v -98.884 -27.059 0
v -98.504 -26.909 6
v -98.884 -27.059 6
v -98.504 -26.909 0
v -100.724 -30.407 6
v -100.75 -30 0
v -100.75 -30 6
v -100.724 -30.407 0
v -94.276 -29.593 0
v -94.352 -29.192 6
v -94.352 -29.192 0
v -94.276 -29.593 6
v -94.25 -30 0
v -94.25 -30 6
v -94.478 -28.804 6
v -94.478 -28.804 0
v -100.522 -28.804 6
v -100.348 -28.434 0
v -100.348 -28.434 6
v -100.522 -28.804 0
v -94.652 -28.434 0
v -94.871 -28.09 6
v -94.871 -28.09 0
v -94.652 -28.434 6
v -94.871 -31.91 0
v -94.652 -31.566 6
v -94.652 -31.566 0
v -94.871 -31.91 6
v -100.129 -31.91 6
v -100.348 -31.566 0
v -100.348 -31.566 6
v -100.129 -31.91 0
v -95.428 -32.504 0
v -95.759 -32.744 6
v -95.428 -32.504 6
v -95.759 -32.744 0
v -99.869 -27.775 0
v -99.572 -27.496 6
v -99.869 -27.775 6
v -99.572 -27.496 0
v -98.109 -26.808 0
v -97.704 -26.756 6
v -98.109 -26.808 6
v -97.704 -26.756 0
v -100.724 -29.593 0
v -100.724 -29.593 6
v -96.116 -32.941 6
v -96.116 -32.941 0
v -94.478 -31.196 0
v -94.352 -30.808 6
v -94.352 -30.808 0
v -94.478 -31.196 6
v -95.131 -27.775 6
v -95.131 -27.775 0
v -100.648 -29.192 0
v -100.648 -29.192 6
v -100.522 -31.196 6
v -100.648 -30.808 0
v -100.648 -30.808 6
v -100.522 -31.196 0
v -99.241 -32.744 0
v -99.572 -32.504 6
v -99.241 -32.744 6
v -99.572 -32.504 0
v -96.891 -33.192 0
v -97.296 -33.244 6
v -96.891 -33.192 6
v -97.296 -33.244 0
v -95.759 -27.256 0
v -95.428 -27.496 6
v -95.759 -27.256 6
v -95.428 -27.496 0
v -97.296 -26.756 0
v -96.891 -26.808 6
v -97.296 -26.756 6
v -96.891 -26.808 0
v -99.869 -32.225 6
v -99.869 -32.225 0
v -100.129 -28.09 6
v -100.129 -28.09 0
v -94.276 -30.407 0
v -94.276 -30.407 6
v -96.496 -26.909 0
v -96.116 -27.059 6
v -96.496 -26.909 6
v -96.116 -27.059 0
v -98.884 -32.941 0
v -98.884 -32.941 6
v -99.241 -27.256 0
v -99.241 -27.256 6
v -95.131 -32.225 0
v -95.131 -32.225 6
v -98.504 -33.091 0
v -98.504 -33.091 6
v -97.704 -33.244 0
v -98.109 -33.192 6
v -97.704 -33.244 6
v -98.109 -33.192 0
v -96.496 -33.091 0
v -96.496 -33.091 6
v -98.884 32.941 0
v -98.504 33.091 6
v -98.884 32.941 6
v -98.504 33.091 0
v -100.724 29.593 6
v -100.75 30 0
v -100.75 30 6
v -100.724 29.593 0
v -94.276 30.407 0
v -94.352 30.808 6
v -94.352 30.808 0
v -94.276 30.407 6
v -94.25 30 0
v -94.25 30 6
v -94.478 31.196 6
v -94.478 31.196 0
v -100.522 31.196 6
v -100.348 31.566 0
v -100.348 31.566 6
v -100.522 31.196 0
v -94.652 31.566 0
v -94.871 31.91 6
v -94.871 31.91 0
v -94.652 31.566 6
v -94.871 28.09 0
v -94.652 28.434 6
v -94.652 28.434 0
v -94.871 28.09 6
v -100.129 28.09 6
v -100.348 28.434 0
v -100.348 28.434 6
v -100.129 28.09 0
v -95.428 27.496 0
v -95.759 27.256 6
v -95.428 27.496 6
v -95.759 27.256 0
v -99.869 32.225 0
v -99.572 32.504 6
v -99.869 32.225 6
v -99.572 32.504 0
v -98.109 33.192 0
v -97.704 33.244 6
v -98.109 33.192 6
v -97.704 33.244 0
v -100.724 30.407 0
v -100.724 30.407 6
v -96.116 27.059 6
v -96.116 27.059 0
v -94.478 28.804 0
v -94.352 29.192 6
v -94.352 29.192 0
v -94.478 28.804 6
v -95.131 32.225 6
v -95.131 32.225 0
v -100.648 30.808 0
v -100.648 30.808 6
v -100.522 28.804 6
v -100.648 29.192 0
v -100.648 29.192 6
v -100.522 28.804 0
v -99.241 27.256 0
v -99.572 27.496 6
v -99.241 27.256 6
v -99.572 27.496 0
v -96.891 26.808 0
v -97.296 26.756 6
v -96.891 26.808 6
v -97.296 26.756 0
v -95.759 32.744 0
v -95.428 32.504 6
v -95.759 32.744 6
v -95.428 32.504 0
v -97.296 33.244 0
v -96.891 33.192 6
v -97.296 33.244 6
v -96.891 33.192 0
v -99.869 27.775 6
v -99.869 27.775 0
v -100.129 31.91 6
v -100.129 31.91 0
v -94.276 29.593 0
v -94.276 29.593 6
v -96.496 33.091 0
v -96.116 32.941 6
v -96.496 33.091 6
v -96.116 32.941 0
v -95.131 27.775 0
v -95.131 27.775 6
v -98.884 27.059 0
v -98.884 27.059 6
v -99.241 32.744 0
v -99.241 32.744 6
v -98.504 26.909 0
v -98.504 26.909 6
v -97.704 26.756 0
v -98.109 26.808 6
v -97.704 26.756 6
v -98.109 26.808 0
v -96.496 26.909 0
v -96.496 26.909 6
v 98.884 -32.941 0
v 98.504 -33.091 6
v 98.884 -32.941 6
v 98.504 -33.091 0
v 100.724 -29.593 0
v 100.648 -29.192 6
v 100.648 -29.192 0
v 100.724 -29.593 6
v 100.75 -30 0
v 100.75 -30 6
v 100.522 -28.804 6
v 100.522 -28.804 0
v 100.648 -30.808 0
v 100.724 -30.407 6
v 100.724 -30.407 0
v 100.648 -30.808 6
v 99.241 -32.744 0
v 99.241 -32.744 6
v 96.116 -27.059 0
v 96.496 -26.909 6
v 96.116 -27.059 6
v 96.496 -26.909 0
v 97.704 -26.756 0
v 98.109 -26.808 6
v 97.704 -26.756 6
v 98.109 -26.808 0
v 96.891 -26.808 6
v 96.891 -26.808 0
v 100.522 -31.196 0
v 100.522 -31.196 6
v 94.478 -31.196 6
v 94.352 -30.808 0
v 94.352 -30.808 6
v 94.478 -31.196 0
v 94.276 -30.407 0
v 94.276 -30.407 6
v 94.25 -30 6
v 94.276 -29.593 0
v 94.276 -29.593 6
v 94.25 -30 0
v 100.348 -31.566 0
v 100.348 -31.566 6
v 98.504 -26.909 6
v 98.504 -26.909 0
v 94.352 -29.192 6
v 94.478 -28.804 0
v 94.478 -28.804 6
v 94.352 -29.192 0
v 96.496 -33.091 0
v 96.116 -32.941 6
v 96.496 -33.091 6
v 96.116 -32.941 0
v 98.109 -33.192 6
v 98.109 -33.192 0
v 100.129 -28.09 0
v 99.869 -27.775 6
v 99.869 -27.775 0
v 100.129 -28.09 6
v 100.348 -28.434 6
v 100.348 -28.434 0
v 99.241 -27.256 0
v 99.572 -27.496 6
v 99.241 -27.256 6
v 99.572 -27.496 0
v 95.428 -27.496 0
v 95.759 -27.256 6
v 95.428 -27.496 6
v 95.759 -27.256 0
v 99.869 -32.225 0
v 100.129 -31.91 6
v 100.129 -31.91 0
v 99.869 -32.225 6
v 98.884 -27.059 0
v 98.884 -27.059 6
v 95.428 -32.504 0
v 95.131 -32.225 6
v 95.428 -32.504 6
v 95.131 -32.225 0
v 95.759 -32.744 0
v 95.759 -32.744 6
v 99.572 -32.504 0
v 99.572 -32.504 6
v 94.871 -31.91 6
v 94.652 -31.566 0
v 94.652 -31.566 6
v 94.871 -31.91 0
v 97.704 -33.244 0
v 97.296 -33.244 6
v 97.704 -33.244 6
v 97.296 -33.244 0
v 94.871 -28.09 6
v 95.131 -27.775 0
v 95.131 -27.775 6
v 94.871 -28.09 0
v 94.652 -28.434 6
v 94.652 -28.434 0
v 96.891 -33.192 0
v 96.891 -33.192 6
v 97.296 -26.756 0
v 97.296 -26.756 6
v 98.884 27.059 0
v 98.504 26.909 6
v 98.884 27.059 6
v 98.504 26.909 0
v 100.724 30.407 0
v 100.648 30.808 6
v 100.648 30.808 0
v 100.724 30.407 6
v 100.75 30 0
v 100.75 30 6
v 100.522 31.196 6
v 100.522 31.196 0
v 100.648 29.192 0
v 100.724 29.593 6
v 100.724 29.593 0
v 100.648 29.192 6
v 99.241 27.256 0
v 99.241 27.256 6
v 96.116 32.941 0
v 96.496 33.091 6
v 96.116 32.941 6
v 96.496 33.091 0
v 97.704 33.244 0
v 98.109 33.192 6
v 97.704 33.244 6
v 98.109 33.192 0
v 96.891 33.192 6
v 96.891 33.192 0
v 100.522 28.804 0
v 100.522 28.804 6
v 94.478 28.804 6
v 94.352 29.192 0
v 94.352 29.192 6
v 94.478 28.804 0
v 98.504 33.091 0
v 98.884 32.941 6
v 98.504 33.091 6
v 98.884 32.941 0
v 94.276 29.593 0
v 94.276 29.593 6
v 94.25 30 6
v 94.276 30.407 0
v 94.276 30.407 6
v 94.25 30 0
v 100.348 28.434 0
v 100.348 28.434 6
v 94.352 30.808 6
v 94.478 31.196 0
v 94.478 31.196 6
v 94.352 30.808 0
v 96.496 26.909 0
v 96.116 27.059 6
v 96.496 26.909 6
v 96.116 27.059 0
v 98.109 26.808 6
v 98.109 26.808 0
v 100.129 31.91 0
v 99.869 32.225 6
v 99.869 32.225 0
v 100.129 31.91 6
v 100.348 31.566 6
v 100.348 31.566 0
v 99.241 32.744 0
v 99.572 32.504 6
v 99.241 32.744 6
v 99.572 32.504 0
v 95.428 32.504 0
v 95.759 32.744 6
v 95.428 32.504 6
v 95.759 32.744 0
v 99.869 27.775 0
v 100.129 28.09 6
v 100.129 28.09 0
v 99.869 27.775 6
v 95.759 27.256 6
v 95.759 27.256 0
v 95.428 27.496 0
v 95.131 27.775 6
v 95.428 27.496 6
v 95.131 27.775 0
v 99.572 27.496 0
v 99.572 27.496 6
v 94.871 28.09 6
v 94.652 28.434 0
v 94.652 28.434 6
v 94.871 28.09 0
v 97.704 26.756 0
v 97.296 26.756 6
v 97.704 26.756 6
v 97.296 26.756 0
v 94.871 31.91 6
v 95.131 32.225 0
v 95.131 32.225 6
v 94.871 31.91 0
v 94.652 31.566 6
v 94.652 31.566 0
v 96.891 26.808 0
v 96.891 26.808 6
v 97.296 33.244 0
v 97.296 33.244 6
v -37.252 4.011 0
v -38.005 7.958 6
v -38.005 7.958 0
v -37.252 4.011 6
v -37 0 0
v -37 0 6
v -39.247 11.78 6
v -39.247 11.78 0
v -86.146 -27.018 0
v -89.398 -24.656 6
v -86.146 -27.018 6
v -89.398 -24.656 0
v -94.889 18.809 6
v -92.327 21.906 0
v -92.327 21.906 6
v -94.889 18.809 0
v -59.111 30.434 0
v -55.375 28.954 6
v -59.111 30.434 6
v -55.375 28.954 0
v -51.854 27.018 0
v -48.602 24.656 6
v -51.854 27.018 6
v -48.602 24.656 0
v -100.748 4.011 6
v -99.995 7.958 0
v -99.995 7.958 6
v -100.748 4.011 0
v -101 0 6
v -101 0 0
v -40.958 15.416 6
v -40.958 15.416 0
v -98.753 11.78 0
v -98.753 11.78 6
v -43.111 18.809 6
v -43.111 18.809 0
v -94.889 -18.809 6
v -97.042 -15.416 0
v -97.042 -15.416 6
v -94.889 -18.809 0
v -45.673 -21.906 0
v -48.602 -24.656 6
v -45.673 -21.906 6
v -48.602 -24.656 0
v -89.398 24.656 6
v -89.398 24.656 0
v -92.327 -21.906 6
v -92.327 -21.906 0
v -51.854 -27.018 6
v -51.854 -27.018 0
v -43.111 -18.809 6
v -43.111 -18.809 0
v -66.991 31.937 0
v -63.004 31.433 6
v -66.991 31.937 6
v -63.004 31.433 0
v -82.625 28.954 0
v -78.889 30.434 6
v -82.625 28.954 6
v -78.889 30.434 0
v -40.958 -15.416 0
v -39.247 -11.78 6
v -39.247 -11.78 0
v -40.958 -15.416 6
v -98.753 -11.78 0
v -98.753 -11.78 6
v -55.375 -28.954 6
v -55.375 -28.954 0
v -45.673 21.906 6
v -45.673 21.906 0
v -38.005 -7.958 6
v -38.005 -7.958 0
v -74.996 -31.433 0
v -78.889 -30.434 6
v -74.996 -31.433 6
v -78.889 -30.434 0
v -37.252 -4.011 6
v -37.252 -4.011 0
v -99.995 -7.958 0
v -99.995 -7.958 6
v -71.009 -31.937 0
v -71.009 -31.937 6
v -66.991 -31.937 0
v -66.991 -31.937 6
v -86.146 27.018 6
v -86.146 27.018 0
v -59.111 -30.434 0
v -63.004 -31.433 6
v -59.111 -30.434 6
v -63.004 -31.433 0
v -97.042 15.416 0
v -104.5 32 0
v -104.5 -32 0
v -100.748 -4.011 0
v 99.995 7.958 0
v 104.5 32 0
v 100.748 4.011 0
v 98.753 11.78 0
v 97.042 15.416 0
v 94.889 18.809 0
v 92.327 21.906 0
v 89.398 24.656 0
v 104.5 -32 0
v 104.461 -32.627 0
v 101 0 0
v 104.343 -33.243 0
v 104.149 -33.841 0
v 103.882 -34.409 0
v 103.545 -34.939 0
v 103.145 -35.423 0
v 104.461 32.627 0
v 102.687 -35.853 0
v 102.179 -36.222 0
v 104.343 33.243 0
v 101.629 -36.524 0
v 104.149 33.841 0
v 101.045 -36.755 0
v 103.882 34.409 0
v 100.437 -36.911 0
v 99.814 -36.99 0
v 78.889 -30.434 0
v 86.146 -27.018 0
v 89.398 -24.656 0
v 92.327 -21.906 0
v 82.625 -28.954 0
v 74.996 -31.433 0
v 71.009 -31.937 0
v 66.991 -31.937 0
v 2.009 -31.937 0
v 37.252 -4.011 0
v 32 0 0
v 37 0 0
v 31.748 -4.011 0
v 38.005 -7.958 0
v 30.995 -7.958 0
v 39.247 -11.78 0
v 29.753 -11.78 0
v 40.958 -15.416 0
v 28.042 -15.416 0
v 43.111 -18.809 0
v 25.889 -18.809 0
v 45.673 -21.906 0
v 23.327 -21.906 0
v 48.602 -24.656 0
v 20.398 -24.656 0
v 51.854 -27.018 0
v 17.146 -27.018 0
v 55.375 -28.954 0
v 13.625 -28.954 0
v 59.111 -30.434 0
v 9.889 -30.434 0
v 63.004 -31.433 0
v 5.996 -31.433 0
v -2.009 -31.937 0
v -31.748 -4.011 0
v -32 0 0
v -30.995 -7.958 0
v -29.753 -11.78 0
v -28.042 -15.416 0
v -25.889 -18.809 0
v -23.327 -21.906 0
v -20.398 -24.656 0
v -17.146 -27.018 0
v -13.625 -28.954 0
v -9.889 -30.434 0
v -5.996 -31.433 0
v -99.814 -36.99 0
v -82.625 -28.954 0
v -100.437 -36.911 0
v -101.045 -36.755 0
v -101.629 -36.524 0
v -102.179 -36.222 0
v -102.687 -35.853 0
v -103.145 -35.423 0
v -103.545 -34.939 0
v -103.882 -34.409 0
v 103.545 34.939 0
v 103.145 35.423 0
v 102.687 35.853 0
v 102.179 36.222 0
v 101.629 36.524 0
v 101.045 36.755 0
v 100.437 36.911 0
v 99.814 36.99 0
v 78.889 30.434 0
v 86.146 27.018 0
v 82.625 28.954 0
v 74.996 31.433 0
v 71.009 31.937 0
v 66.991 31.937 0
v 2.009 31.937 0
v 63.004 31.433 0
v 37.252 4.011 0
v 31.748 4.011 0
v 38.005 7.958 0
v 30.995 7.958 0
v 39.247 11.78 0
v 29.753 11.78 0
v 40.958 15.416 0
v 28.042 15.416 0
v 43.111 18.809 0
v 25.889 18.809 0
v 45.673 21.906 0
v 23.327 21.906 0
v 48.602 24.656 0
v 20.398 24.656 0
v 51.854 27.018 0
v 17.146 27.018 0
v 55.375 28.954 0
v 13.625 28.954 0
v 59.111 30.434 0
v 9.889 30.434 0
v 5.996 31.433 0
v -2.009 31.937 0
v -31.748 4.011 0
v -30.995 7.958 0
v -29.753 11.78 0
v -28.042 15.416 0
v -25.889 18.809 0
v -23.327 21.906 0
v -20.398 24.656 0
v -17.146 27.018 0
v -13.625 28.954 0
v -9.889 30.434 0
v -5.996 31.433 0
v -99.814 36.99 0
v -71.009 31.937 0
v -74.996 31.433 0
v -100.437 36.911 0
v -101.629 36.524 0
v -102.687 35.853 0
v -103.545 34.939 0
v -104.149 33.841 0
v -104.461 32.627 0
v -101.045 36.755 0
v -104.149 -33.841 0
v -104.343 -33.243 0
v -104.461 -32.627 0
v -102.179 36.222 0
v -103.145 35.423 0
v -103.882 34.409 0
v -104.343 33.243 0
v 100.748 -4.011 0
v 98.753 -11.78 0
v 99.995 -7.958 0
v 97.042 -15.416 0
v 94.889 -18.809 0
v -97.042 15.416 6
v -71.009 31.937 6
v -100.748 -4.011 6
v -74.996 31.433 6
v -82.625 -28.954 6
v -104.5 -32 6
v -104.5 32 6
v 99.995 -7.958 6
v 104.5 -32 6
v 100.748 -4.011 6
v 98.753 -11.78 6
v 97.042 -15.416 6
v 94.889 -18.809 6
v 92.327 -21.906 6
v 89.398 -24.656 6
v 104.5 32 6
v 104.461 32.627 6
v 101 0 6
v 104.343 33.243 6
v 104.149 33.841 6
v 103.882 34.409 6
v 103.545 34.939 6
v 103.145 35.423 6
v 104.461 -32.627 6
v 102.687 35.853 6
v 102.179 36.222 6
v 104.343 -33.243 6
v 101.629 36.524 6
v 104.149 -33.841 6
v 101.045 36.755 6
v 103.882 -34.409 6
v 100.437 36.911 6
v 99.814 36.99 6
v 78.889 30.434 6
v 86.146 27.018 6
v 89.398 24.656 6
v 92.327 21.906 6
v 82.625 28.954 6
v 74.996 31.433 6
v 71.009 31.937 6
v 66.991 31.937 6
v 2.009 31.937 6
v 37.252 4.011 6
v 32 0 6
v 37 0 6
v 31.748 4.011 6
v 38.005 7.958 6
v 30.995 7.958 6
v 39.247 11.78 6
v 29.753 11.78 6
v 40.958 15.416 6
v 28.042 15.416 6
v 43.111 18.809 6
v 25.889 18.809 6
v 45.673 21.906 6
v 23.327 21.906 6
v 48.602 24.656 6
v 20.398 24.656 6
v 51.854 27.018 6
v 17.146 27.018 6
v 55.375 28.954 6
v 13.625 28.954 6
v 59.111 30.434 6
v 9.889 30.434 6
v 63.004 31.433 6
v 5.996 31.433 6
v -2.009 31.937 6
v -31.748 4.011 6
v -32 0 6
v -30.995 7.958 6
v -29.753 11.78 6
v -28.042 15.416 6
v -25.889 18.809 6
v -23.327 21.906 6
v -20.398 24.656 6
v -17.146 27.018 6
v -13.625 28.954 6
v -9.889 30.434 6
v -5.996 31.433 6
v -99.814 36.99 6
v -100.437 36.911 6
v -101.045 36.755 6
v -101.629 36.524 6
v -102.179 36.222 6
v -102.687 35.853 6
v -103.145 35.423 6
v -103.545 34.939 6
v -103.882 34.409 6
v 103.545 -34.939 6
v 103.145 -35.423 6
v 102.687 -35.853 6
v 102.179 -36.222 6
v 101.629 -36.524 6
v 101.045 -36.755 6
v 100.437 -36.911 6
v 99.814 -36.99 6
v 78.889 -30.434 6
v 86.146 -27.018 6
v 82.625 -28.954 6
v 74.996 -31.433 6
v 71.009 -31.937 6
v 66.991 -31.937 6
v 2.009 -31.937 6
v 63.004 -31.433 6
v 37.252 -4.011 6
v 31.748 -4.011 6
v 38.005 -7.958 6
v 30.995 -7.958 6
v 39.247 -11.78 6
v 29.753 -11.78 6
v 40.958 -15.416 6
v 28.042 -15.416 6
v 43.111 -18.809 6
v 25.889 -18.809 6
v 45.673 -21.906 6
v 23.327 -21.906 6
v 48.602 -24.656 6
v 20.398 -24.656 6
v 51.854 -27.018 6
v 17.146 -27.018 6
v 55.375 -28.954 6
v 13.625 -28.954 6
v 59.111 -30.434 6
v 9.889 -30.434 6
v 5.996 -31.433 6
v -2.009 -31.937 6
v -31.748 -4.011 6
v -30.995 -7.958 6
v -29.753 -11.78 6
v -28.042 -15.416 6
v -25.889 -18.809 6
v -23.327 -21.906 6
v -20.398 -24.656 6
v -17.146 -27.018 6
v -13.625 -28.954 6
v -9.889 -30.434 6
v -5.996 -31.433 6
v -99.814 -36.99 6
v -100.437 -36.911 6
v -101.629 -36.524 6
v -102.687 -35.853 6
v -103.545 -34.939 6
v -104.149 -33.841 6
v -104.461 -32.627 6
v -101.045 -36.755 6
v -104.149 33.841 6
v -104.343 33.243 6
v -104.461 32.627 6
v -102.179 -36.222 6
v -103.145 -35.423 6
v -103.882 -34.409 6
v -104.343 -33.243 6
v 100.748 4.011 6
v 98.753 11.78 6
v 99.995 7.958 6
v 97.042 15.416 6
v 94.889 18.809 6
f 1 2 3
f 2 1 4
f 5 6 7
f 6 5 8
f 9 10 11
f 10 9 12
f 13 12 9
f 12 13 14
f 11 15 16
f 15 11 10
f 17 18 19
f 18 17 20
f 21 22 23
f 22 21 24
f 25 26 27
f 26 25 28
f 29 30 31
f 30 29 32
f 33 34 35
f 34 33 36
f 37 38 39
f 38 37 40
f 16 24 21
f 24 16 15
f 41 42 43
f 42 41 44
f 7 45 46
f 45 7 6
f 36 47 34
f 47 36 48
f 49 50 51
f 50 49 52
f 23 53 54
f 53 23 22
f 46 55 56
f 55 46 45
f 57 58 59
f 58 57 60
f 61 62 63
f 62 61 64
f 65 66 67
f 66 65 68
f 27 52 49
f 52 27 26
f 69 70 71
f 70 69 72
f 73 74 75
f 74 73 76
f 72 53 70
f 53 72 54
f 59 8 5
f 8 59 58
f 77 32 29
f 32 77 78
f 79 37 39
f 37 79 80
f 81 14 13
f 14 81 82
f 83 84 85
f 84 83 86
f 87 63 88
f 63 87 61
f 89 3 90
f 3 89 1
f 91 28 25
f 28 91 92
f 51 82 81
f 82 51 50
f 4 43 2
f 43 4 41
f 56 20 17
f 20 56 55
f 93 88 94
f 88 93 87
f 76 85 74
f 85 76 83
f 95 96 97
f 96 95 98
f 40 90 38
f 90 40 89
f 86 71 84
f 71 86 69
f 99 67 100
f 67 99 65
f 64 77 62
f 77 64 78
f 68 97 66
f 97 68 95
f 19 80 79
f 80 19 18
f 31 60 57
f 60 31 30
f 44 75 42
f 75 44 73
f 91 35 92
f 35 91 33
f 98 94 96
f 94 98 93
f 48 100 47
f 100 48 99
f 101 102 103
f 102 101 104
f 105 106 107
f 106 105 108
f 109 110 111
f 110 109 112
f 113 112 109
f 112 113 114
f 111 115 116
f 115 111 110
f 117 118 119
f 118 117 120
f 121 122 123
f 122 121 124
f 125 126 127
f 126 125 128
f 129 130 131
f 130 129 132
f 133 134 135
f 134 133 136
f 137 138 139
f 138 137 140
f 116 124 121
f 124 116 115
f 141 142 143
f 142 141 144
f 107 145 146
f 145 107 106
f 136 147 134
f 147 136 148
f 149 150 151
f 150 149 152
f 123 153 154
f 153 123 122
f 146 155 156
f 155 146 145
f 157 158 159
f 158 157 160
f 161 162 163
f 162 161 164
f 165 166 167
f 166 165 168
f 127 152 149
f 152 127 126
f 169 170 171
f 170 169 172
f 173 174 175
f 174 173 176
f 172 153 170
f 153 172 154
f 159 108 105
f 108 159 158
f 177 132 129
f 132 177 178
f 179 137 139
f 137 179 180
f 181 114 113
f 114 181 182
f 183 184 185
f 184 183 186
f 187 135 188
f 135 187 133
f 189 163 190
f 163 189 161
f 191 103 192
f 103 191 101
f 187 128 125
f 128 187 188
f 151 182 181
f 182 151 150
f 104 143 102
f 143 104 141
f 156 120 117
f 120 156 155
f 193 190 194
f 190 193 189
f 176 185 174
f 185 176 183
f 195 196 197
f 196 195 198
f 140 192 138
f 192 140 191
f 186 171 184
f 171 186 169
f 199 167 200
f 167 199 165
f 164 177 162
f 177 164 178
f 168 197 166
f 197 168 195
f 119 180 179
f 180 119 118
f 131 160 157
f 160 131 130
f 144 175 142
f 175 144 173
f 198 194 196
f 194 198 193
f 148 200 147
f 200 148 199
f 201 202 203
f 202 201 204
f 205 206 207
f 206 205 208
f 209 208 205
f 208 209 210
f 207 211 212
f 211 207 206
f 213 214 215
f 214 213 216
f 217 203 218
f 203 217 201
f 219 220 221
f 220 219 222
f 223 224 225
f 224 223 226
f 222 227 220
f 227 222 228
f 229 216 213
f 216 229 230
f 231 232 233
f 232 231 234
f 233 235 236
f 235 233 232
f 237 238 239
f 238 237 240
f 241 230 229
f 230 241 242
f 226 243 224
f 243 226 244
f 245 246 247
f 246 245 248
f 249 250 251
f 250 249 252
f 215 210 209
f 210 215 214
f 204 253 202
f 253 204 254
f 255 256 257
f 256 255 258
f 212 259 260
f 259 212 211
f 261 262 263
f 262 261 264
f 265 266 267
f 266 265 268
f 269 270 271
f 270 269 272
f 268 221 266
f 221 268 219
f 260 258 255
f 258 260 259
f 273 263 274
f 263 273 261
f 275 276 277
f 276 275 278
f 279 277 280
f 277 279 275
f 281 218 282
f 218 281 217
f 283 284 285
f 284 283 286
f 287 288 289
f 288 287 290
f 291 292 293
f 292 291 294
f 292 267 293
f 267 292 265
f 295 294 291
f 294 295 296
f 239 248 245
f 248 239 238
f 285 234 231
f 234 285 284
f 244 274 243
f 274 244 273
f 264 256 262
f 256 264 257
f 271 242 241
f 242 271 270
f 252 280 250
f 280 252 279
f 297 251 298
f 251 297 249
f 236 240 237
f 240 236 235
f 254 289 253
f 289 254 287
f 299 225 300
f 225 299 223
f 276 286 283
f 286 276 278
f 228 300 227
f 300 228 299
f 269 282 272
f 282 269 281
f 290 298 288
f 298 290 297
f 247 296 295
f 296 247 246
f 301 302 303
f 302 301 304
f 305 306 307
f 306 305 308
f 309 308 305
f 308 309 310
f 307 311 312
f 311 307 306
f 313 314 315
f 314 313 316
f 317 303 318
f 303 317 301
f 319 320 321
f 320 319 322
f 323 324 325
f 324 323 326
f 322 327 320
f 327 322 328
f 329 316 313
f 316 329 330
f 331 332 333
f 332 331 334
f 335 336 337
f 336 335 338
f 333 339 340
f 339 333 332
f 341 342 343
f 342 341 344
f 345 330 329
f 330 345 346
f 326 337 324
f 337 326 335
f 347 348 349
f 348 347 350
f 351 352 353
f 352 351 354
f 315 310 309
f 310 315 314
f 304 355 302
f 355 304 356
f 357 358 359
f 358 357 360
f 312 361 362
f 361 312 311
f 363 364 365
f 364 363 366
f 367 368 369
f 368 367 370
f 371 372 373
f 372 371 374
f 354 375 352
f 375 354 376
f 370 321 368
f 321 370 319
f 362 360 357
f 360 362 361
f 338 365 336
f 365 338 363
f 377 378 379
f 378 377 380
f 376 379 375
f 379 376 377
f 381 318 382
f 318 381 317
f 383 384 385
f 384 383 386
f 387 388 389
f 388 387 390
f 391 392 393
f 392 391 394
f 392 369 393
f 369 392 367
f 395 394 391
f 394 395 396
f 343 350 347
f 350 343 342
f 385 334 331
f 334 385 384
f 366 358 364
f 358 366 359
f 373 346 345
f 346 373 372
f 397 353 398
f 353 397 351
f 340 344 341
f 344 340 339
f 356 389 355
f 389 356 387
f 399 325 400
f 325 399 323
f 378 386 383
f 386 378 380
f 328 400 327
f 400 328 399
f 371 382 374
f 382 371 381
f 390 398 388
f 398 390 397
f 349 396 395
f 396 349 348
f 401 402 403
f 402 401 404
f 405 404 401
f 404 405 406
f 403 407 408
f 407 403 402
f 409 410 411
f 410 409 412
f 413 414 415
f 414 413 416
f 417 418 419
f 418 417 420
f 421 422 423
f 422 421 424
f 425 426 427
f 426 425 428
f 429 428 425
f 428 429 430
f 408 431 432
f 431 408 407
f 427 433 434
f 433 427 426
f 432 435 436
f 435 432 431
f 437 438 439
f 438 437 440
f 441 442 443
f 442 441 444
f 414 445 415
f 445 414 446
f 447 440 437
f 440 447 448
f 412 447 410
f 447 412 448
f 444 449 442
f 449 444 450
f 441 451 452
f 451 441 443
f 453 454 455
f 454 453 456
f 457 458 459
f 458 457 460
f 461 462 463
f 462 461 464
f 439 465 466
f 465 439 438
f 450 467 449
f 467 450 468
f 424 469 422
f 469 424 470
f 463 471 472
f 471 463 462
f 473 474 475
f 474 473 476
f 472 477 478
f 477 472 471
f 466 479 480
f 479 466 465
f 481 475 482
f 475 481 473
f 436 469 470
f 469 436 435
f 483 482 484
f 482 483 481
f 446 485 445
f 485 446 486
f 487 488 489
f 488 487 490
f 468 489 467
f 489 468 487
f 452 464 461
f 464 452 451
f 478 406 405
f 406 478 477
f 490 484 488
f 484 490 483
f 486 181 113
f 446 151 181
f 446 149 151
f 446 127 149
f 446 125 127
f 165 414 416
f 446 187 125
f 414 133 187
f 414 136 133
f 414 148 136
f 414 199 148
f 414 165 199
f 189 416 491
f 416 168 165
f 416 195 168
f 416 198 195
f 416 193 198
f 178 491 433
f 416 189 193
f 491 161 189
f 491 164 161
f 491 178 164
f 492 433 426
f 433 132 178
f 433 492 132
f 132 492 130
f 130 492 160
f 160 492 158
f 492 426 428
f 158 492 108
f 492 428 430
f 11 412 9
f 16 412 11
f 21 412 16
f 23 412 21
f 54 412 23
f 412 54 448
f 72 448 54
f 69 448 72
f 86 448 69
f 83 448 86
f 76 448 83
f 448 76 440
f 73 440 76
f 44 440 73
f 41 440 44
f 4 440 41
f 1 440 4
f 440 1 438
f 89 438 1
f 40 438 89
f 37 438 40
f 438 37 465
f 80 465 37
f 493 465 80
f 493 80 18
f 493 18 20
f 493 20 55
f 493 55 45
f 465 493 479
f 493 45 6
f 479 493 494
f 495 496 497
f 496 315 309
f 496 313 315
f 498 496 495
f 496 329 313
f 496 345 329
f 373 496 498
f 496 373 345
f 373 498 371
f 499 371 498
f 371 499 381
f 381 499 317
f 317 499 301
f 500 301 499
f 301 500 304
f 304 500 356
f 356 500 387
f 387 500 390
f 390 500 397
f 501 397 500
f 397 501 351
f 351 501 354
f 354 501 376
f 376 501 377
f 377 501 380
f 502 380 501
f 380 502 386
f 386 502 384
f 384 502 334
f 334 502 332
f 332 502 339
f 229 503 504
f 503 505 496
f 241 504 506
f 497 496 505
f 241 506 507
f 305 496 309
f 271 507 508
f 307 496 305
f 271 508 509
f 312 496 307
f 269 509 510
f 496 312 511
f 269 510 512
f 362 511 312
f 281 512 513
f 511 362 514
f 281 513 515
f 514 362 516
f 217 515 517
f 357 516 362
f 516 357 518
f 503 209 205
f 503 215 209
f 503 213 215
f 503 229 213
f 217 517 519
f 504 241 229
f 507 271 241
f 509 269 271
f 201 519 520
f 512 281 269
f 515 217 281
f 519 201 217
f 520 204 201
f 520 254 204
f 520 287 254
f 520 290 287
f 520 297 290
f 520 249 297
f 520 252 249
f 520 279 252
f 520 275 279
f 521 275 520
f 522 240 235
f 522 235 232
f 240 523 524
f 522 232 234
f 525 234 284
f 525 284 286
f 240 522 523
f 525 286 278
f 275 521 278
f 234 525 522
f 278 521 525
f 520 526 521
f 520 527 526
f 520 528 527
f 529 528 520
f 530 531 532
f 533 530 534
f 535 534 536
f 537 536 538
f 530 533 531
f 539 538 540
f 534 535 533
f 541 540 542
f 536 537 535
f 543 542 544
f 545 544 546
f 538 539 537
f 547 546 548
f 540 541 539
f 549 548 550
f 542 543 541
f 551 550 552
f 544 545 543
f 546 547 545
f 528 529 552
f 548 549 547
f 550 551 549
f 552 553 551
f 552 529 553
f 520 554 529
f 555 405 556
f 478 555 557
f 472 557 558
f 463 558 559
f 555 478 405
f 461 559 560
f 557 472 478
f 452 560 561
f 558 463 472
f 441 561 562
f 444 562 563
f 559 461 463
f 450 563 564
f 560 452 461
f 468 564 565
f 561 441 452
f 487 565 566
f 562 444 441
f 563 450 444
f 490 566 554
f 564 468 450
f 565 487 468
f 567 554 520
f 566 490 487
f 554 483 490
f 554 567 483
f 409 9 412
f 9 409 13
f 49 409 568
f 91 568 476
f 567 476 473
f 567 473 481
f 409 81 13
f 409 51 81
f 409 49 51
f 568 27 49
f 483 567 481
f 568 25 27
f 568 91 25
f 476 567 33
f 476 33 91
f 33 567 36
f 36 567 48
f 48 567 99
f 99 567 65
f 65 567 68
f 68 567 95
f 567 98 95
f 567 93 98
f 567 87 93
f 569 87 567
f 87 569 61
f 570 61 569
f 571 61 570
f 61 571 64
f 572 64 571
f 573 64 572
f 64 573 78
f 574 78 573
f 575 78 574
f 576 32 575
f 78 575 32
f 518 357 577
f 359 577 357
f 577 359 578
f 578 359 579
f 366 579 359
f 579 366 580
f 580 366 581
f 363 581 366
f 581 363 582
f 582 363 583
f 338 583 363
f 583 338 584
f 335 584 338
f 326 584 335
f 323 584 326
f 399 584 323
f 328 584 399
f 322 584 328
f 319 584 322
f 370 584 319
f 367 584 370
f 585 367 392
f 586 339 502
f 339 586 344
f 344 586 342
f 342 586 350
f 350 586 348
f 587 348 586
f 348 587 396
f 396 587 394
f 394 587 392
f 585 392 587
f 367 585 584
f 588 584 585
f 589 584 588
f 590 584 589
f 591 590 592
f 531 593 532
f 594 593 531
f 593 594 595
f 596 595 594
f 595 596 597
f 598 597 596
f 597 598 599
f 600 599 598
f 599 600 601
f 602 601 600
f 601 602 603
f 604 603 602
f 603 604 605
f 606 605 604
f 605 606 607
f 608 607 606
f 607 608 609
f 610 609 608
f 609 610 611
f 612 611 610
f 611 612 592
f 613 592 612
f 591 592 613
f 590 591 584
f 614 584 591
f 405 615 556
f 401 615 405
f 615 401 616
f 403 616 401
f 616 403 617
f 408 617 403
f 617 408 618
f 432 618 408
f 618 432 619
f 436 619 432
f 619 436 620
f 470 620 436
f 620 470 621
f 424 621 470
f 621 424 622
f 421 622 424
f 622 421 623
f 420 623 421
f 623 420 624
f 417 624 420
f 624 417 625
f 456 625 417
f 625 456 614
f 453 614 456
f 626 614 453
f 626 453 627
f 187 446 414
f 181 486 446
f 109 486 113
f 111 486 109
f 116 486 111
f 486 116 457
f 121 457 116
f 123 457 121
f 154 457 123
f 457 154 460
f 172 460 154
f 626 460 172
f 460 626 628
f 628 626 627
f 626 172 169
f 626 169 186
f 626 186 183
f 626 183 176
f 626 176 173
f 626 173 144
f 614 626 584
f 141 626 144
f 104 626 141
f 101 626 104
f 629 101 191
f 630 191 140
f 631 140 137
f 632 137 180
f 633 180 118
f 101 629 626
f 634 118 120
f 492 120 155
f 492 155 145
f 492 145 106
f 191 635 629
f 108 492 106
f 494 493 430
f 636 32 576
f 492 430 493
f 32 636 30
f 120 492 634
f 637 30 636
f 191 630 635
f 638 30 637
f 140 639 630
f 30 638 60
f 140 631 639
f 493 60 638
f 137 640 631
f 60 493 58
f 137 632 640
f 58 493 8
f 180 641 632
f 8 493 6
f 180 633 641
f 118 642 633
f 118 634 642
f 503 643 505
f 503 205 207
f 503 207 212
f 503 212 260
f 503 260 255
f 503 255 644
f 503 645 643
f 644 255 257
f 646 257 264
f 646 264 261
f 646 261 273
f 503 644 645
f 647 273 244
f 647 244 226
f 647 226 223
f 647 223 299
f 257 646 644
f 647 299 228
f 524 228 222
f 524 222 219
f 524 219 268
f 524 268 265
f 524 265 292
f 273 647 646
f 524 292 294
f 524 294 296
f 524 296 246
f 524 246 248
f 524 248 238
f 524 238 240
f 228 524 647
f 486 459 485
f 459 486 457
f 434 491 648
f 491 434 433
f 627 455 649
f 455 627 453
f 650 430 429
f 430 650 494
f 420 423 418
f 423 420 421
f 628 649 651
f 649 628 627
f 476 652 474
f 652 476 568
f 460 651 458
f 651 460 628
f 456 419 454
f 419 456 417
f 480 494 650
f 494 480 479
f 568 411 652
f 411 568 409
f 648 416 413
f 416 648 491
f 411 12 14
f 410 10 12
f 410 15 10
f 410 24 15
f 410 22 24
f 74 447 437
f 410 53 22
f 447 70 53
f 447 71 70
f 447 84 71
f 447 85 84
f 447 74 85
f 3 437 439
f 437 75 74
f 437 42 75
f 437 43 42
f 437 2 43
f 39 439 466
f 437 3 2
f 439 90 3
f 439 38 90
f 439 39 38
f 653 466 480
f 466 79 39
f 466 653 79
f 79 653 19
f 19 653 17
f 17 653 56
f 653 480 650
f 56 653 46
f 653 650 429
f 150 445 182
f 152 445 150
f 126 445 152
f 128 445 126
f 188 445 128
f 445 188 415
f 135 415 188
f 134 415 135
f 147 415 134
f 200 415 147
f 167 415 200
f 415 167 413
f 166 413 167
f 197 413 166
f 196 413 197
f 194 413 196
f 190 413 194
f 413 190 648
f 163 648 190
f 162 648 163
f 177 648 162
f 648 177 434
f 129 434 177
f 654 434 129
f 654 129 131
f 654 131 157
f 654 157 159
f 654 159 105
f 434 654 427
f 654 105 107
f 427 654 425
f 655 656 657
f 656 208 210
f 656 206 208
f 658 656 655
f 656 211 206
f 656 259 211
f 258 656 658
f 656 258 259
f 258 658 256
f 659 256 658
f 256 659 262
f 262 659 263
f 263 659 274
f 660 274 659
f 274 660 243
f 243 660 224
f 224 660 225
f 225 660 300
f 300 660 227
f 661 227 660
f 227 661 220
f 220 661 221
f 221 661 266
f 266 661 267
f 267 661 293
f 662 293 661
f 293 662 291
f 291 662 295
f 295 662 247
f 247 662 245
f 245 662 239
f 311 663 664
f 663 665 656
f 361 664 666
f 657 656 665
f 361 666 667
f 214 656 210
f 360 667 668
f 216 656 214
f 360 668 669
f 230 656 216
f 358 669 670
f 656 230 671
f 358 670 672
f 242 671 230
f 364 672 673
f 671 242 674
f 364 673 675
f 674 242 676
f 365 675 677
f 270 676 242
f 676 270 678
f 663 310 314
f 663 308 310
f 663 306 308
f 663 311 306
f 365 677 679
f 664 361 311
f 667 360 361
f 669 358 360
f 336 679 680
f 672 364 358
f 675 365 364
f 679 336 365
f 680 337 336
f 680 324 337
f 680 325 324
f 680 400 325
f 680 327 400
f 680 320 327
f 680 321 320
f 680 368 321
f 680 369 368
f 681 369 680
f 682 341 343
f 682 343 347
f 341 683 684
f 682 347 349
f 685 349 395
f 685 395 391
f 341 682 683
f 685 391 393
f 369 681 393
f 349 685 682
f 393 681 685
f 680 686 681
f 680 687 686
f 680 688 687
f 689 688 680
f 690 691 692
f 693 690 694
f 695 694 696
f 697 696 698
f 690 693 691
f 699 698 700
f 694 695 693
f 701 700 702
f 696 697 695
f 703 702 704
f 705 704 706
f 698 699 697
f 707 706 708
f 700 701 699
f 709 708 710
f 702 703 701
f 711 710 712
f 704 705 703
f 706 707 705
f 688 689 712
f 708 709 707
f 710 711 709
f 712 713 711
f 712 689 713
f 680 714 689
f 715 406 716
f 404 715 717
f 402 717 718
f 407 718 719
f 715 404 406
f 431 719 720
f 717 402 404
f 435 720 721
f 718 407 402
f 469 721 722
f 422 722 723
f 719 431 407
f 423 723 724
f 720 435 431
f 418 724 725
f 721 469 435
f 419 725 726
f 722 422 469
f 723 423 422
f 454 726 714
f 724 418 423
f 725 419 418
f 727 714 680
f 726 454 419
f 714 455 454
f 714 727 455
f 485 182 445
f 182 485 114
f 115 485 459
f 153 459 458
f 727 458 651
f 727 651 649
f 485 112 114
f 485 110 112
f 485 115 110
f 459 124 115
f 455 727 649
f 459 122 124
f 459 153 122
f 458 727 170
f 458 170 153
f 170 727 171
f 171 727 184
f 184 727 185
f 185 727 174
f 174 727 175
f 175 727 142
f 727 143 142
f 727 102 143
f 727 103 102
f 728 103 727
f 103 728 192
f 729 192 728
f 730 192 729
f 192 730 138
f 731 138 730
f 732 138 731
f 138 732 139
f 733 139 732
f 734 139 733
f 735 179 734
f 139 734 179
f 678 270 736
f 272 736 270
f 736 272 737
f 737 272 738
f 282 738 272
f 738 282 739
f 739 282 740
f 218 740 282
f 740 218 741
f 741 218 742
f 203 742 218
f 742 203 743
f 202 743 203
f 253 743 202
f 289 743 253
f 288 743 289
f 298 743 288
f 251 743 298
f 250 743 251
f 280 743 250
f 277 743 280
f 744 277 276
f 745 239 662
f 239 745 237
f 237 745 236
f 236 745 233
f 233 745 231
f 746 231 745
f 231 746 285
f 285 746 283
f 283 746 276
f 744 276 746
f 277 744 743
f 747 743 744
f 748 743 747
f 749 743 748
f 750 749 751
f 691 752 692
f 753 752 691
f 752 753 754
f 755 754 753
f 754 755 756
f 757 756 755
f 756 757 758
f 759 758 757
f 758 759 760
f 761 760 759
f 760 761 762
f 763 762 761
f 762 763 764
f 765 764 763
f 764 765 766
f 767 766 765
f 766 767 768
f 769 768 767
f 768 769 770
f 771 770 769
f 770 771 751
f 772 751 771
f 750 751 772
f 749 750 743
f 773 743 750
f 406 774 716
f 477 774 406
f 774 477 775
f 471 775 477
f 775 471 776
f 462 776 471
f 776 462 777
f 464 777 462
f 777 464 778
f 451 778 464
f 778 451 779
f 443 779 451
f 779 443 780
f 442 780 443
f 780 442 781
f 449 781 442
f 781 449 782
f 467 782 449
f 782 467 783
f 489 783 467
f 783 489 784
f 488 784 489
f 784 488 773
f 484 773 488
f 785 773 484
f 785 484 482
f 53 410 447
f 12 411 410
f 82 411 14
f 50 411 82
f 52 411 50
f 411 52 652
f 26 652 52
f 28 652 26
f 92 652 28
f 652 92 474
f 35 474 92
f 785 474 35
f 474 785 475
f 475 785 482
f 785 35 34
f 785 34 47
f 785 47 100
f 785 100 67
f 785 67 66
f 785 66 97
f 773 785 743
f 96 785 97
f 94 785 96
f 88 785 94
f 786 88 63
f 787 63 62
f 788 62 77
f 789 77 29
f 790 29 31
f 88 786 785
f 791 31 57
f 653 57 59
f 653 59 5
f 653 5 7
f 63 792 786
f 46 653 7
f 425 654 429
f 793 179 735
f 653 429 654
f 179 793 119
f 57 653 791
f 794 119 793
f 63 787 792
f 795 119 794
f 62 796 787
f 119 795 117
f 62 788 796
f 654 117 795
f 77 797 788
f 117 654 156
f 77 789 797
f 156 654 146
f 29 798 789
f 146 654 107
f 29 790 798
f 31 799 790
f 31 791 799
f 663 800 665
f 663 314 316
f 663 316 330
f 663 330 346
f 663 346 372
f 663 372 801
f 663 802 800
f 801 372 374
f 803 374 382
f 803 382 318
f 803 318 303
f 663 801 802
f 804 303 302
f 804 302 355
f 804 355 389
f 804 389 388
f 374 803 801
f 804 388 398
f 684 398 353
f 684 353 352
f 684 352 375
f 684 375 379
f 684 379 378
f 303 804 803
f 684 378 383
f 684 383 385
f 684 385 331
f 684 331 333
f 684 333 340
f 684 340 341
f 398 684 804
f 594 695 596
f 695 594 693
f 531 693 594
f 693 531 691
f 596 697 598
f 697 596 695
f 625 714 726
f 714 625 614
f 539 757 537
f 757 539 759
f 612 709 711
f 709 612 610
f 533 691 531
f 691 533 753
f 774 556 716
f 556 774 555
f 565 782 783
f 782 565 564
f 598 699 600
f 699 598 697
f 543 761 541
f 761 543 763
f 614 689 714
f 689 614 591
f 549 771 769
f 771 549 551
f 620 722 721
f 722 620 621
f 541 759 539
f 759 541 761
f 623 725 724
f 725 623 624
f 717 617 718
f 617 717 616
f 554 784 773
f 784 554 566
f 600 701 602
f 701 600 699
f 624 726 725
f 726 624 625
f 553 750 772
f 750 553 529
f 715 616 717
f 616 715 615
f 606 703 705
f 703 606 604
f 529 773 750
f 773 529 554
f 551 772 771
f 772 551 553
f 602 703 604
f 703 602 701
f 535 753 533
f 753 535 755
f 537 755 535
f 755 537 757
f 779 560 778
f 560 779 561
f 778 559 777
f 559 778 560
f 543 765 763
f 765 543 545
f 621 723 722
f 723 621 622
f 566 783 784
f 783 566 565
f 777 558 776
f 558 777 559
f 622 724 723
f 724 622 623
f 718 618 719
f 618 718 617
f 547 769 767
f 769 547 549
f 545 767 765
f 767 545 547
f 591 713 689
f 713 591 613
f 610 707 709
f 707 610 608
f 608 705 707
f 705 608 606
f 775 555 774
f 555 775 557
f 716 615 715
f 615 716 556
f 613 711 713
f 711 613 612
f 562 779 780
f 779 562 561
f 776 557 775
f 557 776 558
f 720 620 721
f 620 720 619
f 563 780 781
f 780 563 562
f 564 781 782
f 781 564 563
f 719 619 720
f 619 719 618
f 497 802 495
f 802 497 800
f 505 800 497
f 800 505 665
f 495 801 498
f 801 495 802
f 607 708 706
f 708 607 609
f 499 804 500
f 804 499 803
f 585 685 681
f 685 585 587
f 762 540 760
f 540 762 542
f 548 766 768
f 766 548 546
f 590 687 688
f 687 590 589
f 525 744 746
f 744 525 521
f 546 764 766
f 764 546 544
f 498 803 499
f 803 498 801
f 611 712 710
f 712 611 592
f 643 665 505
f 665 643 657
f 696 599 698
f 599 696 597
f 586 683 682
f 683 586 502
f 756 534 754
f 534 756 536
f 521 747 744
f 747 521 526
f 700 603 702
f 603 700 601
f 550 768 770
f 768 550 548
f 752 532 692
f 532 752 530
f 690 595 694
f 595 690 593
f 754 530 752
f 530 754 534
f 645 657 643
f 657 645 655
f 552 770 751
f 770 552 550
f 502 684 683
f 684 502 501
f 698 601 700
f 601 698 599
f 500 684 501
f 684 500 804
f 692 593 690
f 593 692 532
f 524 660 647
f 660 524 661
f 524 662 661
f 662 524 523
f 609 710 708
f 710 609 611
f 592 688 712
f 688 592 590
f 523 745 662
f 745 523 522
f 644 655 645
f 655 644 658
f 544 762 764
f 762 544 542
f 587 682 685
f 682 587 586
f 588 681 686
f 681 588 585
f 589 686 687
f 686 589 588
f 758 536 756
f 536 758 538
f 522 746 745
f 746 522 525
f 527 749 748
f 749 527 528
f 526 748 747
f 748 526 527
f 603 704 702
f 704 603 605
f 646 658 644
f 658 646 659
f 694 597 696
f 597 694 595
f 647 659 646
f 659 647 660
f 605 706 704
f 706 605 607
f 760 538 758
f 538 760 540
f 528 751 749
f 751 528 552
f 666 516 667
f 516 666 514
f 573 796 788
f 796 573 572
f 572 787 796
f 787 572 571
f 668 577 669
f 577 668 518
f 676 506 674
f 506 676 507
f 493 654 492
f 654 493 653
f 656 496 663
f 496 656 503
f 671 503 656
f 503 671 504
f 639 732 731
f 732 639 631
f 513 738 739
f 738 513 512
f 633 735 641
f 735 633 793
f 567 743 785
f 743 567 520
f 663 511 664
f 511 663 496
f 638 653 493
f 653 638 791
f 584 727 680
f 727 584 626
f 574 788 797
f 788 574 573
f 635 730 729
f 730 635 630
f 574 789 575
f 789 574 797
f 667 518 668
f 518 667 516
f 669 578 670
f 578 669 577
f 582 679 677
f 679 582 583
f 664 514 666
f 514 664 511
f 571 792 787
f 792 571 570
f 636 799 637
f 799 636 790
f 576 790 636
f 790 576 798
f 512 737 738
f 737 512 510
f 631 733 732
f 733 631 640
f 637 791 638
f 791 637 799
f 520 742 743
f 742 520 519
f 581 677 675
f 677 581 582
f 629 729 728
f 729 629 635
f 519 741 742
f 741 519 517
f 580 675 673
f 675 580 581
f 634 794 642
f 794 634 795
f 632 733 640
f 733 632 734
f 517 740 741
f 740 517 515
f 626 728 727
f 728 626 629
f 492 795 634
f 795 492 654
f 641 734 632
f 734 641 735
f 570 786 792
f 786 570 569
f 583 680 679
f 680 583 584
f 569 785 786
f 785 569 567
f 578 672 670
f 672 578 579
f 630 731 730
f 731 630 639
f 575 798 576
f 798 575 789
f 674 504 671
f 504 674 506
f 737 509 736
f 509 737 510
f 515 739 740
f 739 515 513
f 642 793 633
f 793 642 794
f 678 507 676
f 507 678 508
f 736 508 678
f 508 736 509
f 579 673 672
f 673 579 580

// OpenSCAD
$fn = 50;


difference() {
	union() {
		hull() {
			translate(v = [-99.5000000000, 32.0000000000, 0]) {
				cylinder(h = 6, r = 5);
			}
			translate(v = [99.5000000000, 32.0000000000, 0]) {
				cylinder(h = 6, r = 5);
			}
			translate(v = [-99.5000000000, -32.0000000000, 0]) {
				cylinder(h = 6, r = 5);
			}
			translate(v = [99.5000000000, -32.0000000000, 0]) {
				cylinder(h = 6, r = 5);
			}
		}
	}
	union() {
		#translate(v = [-97.5000000000, -30.0000000000, -100.0000000000]) {
			cylinder(h = 200, r = 3.2500000000);
		}
		#translate(v = [-97.5000000000, 30.0000000000, -100.0000000000]) {
			cylinder(h = 200, r = 3.2500000000);
		}
		#translate(v = [97.5000000000, -30.0000000000, -100.0000000000]) {
			cylinder(h = 200, r = 3.2500000000);
		}
		#translate(v = [97.5000000000, 30.0000000000, -100.0000000000]) {
			cylinder(h = 200, r = 3.2500000000);
		}
		#translate(v = [-69.0000000000, 0, 0]) {
			cylinder(h = 6, r = 32.0000000000);
		}
		#cylinder(h = 6, r = 32.0000000000);
		#translate(v = [69.0000000000, 0, 0]) {
			cylinder(h = 6, r = 32.0000000000);
		}
	}
}
